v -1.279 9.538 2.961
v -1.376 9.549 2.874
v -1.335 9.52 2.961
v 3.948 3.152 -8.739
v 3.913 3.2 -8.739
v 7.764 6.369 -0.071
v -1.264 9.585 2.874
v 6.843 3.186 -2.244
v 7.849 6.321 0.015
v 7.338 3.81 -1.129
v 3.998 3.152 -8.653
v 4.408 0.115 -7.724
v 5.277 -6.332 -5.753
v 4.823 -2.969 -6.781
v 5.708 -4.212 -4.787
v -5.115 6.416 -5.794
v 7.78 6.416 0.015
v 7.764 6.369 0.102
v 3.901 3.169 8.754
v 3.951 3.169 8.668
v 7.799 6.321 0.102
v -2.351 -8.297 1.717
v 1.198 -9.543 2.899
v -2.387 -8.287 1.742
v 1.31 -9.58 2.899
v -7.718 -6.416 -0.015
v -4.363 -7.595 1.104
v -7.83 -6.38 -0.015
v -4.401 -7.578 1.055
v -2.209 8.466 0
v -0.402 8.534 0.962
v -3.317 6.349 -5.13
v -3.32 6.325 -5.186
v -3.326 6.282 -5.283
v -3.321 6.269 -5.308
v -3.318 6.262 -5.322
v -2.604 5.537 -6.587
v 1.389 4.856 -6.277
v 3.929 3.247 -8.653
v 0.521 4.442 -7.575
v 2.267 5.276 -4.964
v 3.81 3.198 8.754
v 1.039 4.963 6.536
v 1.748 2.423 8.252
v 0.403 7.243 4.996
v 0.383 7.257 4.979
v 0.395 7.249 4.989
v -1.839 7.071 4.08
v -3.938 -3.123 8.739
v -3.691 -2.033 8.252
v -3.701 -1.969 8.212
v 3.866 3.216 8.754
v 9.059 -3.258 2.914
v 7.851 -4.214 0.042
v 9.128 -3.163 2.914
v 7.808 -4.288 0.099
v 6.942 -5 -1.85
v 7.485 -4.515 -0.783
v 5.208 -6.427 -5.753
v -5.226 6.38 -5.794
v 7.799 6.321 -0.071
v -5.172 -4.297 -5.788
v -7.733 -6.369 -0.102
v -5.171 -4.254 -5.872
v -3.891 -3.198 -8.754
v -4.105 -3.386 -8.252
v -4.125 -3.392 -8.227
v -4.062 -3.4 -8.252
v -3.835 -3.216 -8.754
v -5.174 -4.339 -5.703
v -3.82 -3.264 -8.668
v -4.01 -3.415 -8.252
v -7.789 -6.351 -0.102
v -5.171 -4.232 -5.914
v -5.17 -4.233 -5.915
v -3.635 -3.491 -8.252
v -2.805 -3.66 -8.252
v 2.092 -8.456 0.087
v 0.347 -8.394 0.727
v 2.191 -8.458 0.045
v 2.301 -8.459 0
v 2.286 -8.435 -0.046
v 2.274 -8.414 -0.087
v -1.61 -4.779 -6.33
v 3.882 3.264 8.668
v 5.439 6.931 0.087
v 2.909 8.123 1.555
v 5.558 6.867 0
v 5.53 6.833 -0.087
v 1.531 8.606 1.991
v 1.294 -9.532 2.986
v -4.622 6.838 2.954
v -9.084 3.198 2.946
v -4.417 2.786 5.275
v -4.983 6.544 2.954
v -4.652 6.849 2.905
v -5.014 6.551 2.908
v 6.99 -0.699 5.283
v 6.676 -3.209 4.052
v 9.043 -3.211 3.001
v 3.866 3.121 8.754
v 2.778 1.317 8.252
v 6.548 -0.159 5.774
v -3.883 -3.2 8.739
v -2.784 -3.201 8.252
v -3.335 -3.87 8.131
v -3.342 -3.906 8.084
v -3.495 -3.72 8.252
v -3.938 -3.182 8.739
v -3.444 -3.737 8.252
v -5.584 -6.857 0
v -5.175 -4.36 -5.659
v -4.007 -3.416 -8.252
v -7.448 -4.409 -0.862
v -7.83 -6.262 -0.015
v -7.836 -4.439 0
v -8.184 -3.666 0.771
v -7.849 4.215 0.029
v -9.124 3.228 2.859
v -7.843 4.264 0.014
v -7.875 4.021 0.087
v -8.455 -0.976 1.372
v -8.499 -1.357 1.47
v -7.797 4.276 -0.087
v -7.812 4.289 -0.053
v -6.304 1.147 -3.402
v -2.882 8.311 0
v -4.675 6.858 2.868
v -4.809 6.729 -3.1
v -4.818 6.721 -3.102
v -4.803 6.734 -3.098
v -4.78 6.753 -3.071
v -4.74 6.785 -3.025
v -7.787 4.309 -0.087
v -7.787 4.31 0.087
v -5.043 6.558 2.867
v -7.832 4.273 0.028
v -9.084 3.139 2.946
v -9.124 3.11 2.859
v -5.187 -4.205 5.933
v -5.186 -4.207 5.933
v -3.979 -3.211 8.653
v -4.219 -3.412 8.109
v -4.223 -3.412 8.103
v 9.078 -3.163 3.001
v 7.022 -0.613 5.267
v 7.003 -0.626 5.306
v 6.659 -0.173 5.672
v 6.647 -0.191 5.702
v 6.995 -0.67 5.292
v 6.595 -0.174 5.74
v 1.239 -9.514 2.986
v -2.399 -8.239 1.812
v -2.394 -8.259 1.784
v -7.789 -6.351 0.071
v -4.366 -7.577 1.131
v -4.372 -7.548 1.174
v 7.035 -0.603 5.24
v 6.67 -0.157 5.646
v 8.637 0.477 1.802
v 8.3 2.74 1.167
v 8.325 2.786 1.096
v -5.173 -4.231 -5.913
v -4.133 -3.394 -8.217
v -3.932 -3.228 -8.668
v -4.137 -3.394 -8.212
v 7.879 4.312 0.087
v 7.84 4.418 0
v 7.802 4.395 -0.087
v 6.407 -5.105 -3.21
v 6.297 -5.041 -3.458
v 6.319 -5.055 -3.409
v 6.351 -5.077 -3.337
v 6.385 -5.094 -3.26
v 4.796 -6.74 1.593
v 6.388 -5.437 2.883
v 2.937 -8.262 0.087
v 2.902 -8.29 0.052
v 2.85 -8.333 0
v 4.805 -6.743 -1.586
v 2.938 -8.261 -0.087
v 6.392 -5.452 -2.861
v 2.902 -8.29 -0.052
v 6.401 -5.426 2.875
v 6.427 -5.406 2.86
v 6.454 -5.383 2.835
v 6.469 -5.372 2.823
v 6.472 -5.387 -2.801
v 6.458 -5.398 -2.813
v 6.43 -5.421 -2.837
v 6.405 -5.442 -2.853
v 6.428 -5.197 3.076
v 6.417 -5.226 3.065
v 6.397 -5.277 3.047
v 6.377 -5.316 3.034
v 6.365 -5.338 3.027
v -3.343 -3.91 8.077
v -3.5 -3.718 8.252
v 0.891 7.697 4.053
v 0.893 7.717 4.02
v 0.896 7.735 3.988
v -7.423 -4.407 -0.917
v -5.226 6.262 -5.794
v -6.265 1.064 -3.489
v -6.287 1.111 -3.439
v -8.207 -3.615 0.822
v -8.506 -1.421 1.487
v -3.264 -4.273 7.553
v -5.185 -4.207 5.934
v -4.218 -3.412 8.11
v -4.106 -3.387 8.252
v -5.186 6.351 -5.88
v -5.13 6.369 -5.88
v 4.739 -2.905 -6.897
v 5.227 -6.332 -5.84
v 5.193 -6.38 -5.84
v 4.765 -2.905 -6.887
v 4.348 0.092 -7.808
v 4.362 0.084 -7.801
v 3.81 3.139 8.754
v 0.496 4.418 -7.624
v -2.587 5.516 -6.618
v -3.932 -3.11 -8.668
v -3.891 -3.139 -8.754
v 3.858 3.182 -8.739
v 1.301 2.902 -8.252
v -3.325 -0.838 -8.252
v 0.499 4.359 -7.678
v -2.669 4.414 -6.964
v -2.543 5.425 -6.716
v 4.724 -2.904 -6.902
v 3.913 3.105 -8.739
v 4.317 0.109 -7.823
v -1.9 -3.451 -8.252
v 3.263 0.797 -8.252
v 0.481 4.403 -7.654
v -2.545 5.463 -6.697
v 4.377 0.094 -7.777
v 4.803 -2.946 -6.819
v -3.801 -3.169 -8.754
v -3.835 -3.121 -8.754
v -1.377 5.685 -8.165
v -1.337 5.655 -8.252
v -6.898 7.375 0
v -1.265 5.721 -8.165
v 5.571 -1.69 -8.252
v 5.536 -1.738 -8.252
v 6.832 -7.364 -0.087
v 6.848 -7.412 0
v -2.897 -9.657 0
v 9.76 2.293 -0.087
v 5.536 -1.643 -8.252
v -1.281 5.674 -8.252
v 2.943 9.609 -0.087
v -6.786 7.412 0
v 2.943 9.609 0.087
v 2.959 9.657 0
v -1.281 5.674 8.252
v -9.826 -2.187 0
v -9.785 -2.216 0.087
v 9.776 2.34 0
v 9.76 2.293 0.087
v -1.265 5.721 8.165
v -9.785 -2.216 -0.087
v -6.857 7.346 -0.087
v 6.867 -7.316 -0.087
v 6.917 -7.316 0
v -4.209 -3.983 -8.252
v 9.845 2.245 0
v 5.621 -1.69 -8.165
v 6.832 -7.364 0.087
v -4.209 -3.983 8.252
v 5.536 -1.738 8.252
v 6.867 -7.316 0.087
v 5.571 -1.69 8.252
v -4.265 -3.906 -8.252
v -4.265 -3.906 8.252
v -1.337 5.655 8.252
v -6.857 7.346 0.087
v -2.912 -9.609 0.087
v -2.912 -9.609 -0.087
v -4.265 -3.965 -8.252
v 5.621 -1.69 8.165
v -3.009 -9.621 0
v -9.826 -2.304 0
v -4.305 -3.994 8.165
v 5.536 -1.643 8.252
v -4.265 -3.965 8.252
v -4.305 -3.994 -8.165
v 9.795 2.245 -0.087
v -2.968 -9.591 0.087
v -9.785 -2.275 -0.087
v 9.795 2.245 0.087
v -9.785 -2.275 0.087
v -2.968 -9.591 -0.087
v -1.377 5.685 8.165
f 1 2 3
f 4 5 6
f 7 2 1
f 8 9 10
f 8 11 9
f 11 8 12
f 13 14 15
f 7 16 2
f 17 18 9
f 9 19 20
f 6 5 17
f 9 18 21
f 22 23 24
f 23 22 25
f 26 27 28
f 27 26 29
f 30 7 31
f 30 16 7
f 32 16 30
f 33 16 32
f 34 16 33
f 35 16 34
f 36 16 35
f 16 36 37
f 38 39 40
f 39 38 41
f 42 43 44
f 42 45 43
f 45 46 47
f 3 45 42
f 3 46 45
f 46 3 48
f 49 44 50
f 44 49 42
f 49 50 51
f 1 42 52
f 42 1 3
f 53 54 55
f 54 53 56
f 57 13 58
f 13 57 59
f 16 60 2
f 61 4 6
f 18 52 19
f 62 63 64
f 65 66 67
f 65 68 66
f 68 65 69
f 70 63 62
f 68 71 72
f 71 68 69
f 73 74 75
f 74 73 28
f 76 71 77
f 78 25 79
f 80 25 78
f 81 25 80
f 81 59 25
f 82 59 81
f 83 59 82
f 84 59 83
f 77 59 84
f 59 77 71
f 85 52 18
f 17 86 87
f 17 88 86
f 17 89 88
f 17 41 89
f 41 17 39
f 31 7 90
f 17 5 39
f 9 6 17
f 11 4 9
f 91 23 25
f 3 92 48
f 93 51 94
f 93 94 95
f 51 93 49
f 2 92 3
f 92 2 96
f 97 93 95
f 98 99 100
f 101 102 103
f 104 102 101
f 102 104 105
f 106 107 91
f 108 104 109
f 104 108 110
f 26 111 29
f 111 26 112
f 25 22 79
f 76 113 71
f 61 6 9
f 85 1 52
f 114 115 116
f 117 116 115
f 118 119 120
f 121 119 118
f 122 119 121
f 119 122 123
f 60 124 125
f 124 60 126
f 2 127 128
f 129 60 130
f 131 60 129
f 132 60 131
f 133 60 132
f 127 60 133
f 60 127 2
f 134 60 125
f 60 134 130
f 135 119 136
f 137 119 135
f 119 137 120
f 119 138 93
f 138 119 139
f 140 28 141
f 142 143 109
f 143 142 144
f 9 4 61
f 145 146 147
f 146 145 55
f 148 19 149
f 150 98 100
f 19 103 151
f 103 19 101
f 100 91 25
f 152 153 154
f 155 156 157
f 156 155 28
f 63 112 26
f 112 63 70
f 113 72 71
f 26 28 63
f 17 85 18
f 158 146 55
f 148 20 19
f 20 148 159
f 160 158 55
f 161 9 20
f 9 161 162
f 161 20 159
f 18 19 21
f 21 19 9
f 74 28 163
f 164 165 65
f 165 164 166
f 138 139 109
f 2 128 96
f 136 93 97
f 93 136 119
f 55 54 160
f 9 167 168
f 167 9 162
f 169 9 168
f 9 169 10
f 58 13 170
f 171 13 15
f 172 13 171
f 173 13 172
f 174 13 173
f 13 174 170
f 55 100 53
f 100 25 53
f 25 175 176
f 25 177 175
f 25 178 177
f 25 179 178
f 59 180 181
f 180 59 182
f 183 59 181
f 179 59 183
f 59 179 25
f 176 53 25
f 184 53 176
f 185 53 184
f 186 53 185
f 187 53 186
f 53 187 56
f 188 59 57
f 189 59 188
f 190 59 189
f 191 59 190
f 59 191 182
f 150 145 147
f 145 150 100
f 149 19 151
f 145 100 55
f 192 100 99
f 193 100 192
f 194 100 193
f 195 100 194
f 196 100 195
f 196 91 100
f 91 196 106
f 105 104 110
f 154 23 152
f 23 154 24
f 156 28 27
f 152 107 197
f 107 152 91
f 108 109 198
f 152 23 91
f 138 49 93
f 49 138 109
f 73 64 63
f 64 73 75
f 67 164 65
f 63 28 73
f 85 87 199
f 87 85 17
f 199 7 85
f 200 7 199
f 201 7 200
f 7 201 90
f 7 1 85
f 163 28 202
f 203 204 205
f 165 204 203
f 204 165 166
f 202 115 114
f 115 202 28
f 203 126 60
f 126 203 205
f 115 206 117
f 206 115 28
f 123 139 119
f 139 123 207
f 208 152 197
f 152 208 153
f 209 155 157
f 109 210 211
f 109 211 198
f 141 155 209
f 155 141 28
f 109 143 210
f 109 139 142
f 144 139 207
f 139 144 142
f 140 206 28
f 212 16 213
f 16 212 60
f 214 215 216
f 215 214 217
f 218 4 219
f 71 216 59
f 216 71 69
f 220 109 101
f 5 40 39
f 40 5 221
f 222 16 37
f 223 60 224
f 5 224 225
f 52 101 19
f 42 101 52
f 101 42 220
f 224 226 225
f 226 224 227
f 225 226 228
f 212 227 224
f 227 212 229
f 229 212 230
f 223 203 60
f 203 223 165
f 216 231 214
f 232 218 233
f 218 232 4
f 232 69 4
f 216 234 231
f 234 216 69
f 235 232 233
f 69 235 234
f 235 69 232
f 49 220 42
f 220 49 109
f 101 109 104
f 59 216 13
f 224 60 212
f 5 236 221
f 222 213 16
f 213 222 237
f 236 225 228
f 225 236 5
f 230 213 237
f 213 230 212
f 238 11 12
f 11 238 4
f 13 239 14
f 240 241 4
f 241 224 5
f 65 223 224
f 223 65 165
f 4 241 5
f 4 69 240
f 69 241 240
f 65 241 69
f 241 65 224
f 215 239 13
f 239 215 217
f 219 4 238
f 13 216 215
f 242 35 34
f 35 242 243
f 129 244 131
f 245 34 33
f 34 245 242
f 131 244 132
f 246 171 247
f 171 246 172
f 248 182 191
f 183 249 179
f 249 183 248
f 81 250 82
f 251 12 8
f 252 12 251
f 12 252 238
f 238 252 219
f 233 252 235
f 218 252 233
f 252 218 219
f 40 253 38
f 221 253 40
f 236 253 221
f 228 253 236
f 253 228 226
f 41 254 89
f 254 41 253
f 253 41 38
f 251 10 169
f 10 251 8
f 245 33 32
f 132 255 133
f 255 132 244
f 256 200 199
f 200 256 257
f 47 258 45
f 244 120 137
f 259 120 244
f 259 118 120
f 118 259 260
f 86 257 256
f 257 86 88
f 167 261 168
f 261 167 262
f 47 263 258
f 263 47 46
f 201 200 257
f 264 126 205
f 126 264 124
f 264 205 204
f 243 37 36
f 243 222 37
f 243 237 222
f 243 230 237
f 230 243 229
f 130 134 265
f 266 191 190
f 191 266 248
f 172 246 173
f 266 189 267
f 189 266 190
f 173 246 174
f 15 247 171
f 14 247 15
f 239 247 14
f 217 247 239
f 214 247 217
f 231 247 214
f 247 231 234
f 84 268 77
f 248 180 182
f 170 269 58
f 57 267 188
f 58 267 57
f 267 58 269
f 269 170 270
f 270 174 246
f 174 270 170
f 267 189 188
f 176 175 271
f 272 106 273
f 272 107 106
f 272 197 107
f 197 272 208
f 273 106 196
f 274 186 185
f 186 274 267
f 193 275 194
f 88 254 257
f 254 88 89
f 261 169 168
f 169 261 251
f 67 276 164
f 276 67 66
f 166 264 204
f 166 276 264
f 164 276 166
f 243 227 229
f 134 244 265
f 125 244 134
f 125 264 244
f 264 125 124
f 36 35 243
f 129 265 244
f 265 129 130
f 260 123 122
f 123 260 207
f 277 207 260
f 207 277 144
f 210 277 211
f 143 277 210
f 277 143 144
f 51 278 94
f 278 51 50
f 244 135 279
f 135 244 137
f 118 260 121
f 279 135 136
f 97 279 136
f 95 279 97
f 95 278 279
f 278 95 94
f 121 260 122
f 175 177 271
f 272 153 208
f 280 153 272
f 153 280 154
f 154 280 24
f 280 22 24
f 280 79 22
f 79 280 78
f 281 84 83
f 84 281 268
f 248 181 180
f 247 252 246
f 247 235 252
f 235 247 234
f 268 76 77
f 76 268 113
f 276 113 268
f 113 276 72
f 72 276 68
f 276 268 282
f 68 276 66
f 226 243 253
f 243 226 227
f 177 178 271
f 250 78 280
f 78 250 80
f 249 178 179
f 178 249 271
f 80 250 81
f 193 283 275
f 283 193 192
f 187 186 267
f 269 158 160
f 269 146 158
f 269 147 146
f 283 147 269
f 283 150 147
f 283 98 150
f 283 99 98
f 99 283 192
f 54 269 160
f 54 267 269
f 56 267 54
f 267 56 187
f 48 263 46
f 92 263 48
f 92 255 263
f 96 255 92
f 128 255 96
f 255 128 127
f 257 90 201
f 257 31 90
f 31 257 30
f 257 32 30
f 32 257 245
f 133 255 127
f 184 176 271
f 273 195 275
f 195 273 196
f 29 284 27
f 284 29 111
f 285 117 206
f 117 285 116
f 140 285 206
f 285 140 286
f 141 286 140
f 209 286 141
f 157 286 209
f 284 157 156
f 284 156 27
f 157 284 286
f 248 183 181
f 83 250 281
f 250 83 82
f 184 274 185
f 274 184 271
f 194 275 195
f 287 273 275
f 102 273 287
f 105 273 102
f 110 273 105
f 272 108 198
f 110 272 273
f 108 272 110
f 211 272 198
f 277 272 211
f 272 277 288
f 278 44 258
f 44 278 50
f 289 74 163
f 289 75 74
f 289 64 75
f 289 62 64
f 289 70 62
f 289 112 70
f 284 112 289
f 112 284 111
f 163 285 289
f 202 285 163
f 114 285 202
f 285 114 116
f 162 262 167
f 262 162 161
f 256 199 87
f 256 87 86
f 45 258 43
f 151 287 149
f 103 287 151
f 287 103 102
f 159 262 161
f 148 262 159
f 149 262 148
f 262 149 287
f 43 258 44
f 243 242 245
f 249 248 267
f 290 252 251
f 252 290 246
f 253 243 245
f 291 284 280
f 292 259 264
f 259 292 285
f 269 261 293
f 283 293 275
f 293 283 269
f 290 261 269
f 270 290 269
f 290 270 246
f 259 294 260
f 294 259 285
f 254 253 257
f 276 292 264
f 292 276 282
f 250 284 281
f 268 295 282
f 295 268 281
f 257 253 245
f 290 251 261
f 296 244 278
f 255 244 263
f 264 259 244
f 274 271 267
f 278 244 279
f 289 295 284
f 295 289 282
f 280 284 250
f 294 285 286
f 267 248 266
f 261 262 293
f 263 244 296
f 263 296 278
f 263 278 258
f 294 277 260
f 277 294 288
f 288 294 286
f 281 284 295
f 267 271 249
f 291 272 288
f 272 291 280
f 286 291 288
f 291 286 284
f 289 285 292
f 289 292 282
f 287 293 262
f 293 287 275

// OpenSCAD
// Auto-generated OpenSCAD file

    inner_points = 10*[[-0.42241592184244553, -0.3935709876343616, 0.8164965809276301], [0.552050434404801, -0.1690374254610991, 0.8164965809279018], [-0.1296345125630803, 0.5626084130956421, 0.8164965809276461], [0.5520504344052842, -0.16903742546121997, -0.8164965809275502], [-0.29278140927936525, -0.9561794007300037, -1.5987211554602254e-14], [0.29278140927936525, 0.9561794007300037, 1.5987211554602254e-14], [-0.42241592184196236, -0.3935709876344824, -0.816496580927822], [0.6816849469678814, -0.7316458385567411, 2.5579538487363607e-13], [-0.6816849469678814, 0.7316458385567411, -2.5579538487363607e-13], [-0.12963451256259706, 0.5626084130955212, -0.816496580927806], [-0.9744663562472466, -0.22453356217326248, -2.7176669244139555e-13], [0.9744663562472466, 0.22453356217326248, 2.7176669244139555e-13]];

    outer_points = 10*[[0.1279020562557553, -0.9484628204349614, 0.2899298919706412], [0.5177054037875468, -0.6332250521206378, -0.5753322068648584], [0.9027667961251077, -0.3163375745111199, 0.2914492250228672], [-0.5145441003247264, 0.6321252459238417, -0.5793634802839585], [-0.7748647398693524, -0.6321252459238417, -0.001519333052226013], [0.7748647398693524, 0.6321252459238417, 0.001519333052226013], [-0.904347447856518, 0.316887477609518, 0.2858986185515415], [-0.38506139233756087, -0.316887477609518, -0.8667814318877258], [0.38506139233756087, 0.316887477609518, 0.8667814318877258], [-0.12948270798716557, 0.9490127235333596, 0.28741795160376743], [-0.3898033475317915, -0.31523776831432365, 0.8652620988354998], [0.3898033475317915, 0.31523776831432365, -0.8652620988354998]];

    // Convex hull for inner set (I)
    module inner_hull() {
        hull() {
            for (p = inner_points) {
                translate(p) sphere(r=0.1);
            }
        }
    }

    // Convex hull for outer set (O) minus inner hull (O \ I)
    module outer_minus_inner() {
        difference() {
            hull() {
                for (p = outer_points) {
                    translate(p) sphere(r=0.1);
                }
            }
            inner_hull(); // Subtract inner hull
        }
    }

    // Convex hull for outer set (O) minus all translated inner hulls
    module outer_minus_AllTranslationInner() {
        difference() {
            hull() {
                for (p = outer_points) {
                    translate(p) sphere(r=0.1);
                }
            }
            hull() {
                translate([0,0,50]) inner_hull();
                translate([0,0,-50]) inner_hull();
            }; // Subtract translated inner hulls
        }
    }

    // Difference between outer_minus_inner and outer_minus_AllTranslationInner
    module outer_minus_inner_diff() {
        difference() {
            // Outer minus inner
            difference() {
                hull() {
                    for (p = outer_points) {
                        translate(p) sphere(r=0.1);
                    }
                }
                inner_hull();
            }

            // Subtract Outer minus AllTranslationInner
            difference() {
                hull() {
                    for (p = outer_points) {
                        translate(p) sphere(r=0.1);
                    }
                }
                hull() {
                    translate([0,0,50]) inner_hull();
                    translate([0,0,-50]) inner_hull();
                };
            }
        }
    }

    // Rendering all with colors applied
    color([1, 0, 0, 0.5]) inner_hull(); // Transparent red
    color([0, 1, 0, 1]) outer_minus_AllTranslationInner(); // Opaque green
    color([1, 1, 0, 1]) outer_minus_inner_diff(); // Opaque yellow
    
